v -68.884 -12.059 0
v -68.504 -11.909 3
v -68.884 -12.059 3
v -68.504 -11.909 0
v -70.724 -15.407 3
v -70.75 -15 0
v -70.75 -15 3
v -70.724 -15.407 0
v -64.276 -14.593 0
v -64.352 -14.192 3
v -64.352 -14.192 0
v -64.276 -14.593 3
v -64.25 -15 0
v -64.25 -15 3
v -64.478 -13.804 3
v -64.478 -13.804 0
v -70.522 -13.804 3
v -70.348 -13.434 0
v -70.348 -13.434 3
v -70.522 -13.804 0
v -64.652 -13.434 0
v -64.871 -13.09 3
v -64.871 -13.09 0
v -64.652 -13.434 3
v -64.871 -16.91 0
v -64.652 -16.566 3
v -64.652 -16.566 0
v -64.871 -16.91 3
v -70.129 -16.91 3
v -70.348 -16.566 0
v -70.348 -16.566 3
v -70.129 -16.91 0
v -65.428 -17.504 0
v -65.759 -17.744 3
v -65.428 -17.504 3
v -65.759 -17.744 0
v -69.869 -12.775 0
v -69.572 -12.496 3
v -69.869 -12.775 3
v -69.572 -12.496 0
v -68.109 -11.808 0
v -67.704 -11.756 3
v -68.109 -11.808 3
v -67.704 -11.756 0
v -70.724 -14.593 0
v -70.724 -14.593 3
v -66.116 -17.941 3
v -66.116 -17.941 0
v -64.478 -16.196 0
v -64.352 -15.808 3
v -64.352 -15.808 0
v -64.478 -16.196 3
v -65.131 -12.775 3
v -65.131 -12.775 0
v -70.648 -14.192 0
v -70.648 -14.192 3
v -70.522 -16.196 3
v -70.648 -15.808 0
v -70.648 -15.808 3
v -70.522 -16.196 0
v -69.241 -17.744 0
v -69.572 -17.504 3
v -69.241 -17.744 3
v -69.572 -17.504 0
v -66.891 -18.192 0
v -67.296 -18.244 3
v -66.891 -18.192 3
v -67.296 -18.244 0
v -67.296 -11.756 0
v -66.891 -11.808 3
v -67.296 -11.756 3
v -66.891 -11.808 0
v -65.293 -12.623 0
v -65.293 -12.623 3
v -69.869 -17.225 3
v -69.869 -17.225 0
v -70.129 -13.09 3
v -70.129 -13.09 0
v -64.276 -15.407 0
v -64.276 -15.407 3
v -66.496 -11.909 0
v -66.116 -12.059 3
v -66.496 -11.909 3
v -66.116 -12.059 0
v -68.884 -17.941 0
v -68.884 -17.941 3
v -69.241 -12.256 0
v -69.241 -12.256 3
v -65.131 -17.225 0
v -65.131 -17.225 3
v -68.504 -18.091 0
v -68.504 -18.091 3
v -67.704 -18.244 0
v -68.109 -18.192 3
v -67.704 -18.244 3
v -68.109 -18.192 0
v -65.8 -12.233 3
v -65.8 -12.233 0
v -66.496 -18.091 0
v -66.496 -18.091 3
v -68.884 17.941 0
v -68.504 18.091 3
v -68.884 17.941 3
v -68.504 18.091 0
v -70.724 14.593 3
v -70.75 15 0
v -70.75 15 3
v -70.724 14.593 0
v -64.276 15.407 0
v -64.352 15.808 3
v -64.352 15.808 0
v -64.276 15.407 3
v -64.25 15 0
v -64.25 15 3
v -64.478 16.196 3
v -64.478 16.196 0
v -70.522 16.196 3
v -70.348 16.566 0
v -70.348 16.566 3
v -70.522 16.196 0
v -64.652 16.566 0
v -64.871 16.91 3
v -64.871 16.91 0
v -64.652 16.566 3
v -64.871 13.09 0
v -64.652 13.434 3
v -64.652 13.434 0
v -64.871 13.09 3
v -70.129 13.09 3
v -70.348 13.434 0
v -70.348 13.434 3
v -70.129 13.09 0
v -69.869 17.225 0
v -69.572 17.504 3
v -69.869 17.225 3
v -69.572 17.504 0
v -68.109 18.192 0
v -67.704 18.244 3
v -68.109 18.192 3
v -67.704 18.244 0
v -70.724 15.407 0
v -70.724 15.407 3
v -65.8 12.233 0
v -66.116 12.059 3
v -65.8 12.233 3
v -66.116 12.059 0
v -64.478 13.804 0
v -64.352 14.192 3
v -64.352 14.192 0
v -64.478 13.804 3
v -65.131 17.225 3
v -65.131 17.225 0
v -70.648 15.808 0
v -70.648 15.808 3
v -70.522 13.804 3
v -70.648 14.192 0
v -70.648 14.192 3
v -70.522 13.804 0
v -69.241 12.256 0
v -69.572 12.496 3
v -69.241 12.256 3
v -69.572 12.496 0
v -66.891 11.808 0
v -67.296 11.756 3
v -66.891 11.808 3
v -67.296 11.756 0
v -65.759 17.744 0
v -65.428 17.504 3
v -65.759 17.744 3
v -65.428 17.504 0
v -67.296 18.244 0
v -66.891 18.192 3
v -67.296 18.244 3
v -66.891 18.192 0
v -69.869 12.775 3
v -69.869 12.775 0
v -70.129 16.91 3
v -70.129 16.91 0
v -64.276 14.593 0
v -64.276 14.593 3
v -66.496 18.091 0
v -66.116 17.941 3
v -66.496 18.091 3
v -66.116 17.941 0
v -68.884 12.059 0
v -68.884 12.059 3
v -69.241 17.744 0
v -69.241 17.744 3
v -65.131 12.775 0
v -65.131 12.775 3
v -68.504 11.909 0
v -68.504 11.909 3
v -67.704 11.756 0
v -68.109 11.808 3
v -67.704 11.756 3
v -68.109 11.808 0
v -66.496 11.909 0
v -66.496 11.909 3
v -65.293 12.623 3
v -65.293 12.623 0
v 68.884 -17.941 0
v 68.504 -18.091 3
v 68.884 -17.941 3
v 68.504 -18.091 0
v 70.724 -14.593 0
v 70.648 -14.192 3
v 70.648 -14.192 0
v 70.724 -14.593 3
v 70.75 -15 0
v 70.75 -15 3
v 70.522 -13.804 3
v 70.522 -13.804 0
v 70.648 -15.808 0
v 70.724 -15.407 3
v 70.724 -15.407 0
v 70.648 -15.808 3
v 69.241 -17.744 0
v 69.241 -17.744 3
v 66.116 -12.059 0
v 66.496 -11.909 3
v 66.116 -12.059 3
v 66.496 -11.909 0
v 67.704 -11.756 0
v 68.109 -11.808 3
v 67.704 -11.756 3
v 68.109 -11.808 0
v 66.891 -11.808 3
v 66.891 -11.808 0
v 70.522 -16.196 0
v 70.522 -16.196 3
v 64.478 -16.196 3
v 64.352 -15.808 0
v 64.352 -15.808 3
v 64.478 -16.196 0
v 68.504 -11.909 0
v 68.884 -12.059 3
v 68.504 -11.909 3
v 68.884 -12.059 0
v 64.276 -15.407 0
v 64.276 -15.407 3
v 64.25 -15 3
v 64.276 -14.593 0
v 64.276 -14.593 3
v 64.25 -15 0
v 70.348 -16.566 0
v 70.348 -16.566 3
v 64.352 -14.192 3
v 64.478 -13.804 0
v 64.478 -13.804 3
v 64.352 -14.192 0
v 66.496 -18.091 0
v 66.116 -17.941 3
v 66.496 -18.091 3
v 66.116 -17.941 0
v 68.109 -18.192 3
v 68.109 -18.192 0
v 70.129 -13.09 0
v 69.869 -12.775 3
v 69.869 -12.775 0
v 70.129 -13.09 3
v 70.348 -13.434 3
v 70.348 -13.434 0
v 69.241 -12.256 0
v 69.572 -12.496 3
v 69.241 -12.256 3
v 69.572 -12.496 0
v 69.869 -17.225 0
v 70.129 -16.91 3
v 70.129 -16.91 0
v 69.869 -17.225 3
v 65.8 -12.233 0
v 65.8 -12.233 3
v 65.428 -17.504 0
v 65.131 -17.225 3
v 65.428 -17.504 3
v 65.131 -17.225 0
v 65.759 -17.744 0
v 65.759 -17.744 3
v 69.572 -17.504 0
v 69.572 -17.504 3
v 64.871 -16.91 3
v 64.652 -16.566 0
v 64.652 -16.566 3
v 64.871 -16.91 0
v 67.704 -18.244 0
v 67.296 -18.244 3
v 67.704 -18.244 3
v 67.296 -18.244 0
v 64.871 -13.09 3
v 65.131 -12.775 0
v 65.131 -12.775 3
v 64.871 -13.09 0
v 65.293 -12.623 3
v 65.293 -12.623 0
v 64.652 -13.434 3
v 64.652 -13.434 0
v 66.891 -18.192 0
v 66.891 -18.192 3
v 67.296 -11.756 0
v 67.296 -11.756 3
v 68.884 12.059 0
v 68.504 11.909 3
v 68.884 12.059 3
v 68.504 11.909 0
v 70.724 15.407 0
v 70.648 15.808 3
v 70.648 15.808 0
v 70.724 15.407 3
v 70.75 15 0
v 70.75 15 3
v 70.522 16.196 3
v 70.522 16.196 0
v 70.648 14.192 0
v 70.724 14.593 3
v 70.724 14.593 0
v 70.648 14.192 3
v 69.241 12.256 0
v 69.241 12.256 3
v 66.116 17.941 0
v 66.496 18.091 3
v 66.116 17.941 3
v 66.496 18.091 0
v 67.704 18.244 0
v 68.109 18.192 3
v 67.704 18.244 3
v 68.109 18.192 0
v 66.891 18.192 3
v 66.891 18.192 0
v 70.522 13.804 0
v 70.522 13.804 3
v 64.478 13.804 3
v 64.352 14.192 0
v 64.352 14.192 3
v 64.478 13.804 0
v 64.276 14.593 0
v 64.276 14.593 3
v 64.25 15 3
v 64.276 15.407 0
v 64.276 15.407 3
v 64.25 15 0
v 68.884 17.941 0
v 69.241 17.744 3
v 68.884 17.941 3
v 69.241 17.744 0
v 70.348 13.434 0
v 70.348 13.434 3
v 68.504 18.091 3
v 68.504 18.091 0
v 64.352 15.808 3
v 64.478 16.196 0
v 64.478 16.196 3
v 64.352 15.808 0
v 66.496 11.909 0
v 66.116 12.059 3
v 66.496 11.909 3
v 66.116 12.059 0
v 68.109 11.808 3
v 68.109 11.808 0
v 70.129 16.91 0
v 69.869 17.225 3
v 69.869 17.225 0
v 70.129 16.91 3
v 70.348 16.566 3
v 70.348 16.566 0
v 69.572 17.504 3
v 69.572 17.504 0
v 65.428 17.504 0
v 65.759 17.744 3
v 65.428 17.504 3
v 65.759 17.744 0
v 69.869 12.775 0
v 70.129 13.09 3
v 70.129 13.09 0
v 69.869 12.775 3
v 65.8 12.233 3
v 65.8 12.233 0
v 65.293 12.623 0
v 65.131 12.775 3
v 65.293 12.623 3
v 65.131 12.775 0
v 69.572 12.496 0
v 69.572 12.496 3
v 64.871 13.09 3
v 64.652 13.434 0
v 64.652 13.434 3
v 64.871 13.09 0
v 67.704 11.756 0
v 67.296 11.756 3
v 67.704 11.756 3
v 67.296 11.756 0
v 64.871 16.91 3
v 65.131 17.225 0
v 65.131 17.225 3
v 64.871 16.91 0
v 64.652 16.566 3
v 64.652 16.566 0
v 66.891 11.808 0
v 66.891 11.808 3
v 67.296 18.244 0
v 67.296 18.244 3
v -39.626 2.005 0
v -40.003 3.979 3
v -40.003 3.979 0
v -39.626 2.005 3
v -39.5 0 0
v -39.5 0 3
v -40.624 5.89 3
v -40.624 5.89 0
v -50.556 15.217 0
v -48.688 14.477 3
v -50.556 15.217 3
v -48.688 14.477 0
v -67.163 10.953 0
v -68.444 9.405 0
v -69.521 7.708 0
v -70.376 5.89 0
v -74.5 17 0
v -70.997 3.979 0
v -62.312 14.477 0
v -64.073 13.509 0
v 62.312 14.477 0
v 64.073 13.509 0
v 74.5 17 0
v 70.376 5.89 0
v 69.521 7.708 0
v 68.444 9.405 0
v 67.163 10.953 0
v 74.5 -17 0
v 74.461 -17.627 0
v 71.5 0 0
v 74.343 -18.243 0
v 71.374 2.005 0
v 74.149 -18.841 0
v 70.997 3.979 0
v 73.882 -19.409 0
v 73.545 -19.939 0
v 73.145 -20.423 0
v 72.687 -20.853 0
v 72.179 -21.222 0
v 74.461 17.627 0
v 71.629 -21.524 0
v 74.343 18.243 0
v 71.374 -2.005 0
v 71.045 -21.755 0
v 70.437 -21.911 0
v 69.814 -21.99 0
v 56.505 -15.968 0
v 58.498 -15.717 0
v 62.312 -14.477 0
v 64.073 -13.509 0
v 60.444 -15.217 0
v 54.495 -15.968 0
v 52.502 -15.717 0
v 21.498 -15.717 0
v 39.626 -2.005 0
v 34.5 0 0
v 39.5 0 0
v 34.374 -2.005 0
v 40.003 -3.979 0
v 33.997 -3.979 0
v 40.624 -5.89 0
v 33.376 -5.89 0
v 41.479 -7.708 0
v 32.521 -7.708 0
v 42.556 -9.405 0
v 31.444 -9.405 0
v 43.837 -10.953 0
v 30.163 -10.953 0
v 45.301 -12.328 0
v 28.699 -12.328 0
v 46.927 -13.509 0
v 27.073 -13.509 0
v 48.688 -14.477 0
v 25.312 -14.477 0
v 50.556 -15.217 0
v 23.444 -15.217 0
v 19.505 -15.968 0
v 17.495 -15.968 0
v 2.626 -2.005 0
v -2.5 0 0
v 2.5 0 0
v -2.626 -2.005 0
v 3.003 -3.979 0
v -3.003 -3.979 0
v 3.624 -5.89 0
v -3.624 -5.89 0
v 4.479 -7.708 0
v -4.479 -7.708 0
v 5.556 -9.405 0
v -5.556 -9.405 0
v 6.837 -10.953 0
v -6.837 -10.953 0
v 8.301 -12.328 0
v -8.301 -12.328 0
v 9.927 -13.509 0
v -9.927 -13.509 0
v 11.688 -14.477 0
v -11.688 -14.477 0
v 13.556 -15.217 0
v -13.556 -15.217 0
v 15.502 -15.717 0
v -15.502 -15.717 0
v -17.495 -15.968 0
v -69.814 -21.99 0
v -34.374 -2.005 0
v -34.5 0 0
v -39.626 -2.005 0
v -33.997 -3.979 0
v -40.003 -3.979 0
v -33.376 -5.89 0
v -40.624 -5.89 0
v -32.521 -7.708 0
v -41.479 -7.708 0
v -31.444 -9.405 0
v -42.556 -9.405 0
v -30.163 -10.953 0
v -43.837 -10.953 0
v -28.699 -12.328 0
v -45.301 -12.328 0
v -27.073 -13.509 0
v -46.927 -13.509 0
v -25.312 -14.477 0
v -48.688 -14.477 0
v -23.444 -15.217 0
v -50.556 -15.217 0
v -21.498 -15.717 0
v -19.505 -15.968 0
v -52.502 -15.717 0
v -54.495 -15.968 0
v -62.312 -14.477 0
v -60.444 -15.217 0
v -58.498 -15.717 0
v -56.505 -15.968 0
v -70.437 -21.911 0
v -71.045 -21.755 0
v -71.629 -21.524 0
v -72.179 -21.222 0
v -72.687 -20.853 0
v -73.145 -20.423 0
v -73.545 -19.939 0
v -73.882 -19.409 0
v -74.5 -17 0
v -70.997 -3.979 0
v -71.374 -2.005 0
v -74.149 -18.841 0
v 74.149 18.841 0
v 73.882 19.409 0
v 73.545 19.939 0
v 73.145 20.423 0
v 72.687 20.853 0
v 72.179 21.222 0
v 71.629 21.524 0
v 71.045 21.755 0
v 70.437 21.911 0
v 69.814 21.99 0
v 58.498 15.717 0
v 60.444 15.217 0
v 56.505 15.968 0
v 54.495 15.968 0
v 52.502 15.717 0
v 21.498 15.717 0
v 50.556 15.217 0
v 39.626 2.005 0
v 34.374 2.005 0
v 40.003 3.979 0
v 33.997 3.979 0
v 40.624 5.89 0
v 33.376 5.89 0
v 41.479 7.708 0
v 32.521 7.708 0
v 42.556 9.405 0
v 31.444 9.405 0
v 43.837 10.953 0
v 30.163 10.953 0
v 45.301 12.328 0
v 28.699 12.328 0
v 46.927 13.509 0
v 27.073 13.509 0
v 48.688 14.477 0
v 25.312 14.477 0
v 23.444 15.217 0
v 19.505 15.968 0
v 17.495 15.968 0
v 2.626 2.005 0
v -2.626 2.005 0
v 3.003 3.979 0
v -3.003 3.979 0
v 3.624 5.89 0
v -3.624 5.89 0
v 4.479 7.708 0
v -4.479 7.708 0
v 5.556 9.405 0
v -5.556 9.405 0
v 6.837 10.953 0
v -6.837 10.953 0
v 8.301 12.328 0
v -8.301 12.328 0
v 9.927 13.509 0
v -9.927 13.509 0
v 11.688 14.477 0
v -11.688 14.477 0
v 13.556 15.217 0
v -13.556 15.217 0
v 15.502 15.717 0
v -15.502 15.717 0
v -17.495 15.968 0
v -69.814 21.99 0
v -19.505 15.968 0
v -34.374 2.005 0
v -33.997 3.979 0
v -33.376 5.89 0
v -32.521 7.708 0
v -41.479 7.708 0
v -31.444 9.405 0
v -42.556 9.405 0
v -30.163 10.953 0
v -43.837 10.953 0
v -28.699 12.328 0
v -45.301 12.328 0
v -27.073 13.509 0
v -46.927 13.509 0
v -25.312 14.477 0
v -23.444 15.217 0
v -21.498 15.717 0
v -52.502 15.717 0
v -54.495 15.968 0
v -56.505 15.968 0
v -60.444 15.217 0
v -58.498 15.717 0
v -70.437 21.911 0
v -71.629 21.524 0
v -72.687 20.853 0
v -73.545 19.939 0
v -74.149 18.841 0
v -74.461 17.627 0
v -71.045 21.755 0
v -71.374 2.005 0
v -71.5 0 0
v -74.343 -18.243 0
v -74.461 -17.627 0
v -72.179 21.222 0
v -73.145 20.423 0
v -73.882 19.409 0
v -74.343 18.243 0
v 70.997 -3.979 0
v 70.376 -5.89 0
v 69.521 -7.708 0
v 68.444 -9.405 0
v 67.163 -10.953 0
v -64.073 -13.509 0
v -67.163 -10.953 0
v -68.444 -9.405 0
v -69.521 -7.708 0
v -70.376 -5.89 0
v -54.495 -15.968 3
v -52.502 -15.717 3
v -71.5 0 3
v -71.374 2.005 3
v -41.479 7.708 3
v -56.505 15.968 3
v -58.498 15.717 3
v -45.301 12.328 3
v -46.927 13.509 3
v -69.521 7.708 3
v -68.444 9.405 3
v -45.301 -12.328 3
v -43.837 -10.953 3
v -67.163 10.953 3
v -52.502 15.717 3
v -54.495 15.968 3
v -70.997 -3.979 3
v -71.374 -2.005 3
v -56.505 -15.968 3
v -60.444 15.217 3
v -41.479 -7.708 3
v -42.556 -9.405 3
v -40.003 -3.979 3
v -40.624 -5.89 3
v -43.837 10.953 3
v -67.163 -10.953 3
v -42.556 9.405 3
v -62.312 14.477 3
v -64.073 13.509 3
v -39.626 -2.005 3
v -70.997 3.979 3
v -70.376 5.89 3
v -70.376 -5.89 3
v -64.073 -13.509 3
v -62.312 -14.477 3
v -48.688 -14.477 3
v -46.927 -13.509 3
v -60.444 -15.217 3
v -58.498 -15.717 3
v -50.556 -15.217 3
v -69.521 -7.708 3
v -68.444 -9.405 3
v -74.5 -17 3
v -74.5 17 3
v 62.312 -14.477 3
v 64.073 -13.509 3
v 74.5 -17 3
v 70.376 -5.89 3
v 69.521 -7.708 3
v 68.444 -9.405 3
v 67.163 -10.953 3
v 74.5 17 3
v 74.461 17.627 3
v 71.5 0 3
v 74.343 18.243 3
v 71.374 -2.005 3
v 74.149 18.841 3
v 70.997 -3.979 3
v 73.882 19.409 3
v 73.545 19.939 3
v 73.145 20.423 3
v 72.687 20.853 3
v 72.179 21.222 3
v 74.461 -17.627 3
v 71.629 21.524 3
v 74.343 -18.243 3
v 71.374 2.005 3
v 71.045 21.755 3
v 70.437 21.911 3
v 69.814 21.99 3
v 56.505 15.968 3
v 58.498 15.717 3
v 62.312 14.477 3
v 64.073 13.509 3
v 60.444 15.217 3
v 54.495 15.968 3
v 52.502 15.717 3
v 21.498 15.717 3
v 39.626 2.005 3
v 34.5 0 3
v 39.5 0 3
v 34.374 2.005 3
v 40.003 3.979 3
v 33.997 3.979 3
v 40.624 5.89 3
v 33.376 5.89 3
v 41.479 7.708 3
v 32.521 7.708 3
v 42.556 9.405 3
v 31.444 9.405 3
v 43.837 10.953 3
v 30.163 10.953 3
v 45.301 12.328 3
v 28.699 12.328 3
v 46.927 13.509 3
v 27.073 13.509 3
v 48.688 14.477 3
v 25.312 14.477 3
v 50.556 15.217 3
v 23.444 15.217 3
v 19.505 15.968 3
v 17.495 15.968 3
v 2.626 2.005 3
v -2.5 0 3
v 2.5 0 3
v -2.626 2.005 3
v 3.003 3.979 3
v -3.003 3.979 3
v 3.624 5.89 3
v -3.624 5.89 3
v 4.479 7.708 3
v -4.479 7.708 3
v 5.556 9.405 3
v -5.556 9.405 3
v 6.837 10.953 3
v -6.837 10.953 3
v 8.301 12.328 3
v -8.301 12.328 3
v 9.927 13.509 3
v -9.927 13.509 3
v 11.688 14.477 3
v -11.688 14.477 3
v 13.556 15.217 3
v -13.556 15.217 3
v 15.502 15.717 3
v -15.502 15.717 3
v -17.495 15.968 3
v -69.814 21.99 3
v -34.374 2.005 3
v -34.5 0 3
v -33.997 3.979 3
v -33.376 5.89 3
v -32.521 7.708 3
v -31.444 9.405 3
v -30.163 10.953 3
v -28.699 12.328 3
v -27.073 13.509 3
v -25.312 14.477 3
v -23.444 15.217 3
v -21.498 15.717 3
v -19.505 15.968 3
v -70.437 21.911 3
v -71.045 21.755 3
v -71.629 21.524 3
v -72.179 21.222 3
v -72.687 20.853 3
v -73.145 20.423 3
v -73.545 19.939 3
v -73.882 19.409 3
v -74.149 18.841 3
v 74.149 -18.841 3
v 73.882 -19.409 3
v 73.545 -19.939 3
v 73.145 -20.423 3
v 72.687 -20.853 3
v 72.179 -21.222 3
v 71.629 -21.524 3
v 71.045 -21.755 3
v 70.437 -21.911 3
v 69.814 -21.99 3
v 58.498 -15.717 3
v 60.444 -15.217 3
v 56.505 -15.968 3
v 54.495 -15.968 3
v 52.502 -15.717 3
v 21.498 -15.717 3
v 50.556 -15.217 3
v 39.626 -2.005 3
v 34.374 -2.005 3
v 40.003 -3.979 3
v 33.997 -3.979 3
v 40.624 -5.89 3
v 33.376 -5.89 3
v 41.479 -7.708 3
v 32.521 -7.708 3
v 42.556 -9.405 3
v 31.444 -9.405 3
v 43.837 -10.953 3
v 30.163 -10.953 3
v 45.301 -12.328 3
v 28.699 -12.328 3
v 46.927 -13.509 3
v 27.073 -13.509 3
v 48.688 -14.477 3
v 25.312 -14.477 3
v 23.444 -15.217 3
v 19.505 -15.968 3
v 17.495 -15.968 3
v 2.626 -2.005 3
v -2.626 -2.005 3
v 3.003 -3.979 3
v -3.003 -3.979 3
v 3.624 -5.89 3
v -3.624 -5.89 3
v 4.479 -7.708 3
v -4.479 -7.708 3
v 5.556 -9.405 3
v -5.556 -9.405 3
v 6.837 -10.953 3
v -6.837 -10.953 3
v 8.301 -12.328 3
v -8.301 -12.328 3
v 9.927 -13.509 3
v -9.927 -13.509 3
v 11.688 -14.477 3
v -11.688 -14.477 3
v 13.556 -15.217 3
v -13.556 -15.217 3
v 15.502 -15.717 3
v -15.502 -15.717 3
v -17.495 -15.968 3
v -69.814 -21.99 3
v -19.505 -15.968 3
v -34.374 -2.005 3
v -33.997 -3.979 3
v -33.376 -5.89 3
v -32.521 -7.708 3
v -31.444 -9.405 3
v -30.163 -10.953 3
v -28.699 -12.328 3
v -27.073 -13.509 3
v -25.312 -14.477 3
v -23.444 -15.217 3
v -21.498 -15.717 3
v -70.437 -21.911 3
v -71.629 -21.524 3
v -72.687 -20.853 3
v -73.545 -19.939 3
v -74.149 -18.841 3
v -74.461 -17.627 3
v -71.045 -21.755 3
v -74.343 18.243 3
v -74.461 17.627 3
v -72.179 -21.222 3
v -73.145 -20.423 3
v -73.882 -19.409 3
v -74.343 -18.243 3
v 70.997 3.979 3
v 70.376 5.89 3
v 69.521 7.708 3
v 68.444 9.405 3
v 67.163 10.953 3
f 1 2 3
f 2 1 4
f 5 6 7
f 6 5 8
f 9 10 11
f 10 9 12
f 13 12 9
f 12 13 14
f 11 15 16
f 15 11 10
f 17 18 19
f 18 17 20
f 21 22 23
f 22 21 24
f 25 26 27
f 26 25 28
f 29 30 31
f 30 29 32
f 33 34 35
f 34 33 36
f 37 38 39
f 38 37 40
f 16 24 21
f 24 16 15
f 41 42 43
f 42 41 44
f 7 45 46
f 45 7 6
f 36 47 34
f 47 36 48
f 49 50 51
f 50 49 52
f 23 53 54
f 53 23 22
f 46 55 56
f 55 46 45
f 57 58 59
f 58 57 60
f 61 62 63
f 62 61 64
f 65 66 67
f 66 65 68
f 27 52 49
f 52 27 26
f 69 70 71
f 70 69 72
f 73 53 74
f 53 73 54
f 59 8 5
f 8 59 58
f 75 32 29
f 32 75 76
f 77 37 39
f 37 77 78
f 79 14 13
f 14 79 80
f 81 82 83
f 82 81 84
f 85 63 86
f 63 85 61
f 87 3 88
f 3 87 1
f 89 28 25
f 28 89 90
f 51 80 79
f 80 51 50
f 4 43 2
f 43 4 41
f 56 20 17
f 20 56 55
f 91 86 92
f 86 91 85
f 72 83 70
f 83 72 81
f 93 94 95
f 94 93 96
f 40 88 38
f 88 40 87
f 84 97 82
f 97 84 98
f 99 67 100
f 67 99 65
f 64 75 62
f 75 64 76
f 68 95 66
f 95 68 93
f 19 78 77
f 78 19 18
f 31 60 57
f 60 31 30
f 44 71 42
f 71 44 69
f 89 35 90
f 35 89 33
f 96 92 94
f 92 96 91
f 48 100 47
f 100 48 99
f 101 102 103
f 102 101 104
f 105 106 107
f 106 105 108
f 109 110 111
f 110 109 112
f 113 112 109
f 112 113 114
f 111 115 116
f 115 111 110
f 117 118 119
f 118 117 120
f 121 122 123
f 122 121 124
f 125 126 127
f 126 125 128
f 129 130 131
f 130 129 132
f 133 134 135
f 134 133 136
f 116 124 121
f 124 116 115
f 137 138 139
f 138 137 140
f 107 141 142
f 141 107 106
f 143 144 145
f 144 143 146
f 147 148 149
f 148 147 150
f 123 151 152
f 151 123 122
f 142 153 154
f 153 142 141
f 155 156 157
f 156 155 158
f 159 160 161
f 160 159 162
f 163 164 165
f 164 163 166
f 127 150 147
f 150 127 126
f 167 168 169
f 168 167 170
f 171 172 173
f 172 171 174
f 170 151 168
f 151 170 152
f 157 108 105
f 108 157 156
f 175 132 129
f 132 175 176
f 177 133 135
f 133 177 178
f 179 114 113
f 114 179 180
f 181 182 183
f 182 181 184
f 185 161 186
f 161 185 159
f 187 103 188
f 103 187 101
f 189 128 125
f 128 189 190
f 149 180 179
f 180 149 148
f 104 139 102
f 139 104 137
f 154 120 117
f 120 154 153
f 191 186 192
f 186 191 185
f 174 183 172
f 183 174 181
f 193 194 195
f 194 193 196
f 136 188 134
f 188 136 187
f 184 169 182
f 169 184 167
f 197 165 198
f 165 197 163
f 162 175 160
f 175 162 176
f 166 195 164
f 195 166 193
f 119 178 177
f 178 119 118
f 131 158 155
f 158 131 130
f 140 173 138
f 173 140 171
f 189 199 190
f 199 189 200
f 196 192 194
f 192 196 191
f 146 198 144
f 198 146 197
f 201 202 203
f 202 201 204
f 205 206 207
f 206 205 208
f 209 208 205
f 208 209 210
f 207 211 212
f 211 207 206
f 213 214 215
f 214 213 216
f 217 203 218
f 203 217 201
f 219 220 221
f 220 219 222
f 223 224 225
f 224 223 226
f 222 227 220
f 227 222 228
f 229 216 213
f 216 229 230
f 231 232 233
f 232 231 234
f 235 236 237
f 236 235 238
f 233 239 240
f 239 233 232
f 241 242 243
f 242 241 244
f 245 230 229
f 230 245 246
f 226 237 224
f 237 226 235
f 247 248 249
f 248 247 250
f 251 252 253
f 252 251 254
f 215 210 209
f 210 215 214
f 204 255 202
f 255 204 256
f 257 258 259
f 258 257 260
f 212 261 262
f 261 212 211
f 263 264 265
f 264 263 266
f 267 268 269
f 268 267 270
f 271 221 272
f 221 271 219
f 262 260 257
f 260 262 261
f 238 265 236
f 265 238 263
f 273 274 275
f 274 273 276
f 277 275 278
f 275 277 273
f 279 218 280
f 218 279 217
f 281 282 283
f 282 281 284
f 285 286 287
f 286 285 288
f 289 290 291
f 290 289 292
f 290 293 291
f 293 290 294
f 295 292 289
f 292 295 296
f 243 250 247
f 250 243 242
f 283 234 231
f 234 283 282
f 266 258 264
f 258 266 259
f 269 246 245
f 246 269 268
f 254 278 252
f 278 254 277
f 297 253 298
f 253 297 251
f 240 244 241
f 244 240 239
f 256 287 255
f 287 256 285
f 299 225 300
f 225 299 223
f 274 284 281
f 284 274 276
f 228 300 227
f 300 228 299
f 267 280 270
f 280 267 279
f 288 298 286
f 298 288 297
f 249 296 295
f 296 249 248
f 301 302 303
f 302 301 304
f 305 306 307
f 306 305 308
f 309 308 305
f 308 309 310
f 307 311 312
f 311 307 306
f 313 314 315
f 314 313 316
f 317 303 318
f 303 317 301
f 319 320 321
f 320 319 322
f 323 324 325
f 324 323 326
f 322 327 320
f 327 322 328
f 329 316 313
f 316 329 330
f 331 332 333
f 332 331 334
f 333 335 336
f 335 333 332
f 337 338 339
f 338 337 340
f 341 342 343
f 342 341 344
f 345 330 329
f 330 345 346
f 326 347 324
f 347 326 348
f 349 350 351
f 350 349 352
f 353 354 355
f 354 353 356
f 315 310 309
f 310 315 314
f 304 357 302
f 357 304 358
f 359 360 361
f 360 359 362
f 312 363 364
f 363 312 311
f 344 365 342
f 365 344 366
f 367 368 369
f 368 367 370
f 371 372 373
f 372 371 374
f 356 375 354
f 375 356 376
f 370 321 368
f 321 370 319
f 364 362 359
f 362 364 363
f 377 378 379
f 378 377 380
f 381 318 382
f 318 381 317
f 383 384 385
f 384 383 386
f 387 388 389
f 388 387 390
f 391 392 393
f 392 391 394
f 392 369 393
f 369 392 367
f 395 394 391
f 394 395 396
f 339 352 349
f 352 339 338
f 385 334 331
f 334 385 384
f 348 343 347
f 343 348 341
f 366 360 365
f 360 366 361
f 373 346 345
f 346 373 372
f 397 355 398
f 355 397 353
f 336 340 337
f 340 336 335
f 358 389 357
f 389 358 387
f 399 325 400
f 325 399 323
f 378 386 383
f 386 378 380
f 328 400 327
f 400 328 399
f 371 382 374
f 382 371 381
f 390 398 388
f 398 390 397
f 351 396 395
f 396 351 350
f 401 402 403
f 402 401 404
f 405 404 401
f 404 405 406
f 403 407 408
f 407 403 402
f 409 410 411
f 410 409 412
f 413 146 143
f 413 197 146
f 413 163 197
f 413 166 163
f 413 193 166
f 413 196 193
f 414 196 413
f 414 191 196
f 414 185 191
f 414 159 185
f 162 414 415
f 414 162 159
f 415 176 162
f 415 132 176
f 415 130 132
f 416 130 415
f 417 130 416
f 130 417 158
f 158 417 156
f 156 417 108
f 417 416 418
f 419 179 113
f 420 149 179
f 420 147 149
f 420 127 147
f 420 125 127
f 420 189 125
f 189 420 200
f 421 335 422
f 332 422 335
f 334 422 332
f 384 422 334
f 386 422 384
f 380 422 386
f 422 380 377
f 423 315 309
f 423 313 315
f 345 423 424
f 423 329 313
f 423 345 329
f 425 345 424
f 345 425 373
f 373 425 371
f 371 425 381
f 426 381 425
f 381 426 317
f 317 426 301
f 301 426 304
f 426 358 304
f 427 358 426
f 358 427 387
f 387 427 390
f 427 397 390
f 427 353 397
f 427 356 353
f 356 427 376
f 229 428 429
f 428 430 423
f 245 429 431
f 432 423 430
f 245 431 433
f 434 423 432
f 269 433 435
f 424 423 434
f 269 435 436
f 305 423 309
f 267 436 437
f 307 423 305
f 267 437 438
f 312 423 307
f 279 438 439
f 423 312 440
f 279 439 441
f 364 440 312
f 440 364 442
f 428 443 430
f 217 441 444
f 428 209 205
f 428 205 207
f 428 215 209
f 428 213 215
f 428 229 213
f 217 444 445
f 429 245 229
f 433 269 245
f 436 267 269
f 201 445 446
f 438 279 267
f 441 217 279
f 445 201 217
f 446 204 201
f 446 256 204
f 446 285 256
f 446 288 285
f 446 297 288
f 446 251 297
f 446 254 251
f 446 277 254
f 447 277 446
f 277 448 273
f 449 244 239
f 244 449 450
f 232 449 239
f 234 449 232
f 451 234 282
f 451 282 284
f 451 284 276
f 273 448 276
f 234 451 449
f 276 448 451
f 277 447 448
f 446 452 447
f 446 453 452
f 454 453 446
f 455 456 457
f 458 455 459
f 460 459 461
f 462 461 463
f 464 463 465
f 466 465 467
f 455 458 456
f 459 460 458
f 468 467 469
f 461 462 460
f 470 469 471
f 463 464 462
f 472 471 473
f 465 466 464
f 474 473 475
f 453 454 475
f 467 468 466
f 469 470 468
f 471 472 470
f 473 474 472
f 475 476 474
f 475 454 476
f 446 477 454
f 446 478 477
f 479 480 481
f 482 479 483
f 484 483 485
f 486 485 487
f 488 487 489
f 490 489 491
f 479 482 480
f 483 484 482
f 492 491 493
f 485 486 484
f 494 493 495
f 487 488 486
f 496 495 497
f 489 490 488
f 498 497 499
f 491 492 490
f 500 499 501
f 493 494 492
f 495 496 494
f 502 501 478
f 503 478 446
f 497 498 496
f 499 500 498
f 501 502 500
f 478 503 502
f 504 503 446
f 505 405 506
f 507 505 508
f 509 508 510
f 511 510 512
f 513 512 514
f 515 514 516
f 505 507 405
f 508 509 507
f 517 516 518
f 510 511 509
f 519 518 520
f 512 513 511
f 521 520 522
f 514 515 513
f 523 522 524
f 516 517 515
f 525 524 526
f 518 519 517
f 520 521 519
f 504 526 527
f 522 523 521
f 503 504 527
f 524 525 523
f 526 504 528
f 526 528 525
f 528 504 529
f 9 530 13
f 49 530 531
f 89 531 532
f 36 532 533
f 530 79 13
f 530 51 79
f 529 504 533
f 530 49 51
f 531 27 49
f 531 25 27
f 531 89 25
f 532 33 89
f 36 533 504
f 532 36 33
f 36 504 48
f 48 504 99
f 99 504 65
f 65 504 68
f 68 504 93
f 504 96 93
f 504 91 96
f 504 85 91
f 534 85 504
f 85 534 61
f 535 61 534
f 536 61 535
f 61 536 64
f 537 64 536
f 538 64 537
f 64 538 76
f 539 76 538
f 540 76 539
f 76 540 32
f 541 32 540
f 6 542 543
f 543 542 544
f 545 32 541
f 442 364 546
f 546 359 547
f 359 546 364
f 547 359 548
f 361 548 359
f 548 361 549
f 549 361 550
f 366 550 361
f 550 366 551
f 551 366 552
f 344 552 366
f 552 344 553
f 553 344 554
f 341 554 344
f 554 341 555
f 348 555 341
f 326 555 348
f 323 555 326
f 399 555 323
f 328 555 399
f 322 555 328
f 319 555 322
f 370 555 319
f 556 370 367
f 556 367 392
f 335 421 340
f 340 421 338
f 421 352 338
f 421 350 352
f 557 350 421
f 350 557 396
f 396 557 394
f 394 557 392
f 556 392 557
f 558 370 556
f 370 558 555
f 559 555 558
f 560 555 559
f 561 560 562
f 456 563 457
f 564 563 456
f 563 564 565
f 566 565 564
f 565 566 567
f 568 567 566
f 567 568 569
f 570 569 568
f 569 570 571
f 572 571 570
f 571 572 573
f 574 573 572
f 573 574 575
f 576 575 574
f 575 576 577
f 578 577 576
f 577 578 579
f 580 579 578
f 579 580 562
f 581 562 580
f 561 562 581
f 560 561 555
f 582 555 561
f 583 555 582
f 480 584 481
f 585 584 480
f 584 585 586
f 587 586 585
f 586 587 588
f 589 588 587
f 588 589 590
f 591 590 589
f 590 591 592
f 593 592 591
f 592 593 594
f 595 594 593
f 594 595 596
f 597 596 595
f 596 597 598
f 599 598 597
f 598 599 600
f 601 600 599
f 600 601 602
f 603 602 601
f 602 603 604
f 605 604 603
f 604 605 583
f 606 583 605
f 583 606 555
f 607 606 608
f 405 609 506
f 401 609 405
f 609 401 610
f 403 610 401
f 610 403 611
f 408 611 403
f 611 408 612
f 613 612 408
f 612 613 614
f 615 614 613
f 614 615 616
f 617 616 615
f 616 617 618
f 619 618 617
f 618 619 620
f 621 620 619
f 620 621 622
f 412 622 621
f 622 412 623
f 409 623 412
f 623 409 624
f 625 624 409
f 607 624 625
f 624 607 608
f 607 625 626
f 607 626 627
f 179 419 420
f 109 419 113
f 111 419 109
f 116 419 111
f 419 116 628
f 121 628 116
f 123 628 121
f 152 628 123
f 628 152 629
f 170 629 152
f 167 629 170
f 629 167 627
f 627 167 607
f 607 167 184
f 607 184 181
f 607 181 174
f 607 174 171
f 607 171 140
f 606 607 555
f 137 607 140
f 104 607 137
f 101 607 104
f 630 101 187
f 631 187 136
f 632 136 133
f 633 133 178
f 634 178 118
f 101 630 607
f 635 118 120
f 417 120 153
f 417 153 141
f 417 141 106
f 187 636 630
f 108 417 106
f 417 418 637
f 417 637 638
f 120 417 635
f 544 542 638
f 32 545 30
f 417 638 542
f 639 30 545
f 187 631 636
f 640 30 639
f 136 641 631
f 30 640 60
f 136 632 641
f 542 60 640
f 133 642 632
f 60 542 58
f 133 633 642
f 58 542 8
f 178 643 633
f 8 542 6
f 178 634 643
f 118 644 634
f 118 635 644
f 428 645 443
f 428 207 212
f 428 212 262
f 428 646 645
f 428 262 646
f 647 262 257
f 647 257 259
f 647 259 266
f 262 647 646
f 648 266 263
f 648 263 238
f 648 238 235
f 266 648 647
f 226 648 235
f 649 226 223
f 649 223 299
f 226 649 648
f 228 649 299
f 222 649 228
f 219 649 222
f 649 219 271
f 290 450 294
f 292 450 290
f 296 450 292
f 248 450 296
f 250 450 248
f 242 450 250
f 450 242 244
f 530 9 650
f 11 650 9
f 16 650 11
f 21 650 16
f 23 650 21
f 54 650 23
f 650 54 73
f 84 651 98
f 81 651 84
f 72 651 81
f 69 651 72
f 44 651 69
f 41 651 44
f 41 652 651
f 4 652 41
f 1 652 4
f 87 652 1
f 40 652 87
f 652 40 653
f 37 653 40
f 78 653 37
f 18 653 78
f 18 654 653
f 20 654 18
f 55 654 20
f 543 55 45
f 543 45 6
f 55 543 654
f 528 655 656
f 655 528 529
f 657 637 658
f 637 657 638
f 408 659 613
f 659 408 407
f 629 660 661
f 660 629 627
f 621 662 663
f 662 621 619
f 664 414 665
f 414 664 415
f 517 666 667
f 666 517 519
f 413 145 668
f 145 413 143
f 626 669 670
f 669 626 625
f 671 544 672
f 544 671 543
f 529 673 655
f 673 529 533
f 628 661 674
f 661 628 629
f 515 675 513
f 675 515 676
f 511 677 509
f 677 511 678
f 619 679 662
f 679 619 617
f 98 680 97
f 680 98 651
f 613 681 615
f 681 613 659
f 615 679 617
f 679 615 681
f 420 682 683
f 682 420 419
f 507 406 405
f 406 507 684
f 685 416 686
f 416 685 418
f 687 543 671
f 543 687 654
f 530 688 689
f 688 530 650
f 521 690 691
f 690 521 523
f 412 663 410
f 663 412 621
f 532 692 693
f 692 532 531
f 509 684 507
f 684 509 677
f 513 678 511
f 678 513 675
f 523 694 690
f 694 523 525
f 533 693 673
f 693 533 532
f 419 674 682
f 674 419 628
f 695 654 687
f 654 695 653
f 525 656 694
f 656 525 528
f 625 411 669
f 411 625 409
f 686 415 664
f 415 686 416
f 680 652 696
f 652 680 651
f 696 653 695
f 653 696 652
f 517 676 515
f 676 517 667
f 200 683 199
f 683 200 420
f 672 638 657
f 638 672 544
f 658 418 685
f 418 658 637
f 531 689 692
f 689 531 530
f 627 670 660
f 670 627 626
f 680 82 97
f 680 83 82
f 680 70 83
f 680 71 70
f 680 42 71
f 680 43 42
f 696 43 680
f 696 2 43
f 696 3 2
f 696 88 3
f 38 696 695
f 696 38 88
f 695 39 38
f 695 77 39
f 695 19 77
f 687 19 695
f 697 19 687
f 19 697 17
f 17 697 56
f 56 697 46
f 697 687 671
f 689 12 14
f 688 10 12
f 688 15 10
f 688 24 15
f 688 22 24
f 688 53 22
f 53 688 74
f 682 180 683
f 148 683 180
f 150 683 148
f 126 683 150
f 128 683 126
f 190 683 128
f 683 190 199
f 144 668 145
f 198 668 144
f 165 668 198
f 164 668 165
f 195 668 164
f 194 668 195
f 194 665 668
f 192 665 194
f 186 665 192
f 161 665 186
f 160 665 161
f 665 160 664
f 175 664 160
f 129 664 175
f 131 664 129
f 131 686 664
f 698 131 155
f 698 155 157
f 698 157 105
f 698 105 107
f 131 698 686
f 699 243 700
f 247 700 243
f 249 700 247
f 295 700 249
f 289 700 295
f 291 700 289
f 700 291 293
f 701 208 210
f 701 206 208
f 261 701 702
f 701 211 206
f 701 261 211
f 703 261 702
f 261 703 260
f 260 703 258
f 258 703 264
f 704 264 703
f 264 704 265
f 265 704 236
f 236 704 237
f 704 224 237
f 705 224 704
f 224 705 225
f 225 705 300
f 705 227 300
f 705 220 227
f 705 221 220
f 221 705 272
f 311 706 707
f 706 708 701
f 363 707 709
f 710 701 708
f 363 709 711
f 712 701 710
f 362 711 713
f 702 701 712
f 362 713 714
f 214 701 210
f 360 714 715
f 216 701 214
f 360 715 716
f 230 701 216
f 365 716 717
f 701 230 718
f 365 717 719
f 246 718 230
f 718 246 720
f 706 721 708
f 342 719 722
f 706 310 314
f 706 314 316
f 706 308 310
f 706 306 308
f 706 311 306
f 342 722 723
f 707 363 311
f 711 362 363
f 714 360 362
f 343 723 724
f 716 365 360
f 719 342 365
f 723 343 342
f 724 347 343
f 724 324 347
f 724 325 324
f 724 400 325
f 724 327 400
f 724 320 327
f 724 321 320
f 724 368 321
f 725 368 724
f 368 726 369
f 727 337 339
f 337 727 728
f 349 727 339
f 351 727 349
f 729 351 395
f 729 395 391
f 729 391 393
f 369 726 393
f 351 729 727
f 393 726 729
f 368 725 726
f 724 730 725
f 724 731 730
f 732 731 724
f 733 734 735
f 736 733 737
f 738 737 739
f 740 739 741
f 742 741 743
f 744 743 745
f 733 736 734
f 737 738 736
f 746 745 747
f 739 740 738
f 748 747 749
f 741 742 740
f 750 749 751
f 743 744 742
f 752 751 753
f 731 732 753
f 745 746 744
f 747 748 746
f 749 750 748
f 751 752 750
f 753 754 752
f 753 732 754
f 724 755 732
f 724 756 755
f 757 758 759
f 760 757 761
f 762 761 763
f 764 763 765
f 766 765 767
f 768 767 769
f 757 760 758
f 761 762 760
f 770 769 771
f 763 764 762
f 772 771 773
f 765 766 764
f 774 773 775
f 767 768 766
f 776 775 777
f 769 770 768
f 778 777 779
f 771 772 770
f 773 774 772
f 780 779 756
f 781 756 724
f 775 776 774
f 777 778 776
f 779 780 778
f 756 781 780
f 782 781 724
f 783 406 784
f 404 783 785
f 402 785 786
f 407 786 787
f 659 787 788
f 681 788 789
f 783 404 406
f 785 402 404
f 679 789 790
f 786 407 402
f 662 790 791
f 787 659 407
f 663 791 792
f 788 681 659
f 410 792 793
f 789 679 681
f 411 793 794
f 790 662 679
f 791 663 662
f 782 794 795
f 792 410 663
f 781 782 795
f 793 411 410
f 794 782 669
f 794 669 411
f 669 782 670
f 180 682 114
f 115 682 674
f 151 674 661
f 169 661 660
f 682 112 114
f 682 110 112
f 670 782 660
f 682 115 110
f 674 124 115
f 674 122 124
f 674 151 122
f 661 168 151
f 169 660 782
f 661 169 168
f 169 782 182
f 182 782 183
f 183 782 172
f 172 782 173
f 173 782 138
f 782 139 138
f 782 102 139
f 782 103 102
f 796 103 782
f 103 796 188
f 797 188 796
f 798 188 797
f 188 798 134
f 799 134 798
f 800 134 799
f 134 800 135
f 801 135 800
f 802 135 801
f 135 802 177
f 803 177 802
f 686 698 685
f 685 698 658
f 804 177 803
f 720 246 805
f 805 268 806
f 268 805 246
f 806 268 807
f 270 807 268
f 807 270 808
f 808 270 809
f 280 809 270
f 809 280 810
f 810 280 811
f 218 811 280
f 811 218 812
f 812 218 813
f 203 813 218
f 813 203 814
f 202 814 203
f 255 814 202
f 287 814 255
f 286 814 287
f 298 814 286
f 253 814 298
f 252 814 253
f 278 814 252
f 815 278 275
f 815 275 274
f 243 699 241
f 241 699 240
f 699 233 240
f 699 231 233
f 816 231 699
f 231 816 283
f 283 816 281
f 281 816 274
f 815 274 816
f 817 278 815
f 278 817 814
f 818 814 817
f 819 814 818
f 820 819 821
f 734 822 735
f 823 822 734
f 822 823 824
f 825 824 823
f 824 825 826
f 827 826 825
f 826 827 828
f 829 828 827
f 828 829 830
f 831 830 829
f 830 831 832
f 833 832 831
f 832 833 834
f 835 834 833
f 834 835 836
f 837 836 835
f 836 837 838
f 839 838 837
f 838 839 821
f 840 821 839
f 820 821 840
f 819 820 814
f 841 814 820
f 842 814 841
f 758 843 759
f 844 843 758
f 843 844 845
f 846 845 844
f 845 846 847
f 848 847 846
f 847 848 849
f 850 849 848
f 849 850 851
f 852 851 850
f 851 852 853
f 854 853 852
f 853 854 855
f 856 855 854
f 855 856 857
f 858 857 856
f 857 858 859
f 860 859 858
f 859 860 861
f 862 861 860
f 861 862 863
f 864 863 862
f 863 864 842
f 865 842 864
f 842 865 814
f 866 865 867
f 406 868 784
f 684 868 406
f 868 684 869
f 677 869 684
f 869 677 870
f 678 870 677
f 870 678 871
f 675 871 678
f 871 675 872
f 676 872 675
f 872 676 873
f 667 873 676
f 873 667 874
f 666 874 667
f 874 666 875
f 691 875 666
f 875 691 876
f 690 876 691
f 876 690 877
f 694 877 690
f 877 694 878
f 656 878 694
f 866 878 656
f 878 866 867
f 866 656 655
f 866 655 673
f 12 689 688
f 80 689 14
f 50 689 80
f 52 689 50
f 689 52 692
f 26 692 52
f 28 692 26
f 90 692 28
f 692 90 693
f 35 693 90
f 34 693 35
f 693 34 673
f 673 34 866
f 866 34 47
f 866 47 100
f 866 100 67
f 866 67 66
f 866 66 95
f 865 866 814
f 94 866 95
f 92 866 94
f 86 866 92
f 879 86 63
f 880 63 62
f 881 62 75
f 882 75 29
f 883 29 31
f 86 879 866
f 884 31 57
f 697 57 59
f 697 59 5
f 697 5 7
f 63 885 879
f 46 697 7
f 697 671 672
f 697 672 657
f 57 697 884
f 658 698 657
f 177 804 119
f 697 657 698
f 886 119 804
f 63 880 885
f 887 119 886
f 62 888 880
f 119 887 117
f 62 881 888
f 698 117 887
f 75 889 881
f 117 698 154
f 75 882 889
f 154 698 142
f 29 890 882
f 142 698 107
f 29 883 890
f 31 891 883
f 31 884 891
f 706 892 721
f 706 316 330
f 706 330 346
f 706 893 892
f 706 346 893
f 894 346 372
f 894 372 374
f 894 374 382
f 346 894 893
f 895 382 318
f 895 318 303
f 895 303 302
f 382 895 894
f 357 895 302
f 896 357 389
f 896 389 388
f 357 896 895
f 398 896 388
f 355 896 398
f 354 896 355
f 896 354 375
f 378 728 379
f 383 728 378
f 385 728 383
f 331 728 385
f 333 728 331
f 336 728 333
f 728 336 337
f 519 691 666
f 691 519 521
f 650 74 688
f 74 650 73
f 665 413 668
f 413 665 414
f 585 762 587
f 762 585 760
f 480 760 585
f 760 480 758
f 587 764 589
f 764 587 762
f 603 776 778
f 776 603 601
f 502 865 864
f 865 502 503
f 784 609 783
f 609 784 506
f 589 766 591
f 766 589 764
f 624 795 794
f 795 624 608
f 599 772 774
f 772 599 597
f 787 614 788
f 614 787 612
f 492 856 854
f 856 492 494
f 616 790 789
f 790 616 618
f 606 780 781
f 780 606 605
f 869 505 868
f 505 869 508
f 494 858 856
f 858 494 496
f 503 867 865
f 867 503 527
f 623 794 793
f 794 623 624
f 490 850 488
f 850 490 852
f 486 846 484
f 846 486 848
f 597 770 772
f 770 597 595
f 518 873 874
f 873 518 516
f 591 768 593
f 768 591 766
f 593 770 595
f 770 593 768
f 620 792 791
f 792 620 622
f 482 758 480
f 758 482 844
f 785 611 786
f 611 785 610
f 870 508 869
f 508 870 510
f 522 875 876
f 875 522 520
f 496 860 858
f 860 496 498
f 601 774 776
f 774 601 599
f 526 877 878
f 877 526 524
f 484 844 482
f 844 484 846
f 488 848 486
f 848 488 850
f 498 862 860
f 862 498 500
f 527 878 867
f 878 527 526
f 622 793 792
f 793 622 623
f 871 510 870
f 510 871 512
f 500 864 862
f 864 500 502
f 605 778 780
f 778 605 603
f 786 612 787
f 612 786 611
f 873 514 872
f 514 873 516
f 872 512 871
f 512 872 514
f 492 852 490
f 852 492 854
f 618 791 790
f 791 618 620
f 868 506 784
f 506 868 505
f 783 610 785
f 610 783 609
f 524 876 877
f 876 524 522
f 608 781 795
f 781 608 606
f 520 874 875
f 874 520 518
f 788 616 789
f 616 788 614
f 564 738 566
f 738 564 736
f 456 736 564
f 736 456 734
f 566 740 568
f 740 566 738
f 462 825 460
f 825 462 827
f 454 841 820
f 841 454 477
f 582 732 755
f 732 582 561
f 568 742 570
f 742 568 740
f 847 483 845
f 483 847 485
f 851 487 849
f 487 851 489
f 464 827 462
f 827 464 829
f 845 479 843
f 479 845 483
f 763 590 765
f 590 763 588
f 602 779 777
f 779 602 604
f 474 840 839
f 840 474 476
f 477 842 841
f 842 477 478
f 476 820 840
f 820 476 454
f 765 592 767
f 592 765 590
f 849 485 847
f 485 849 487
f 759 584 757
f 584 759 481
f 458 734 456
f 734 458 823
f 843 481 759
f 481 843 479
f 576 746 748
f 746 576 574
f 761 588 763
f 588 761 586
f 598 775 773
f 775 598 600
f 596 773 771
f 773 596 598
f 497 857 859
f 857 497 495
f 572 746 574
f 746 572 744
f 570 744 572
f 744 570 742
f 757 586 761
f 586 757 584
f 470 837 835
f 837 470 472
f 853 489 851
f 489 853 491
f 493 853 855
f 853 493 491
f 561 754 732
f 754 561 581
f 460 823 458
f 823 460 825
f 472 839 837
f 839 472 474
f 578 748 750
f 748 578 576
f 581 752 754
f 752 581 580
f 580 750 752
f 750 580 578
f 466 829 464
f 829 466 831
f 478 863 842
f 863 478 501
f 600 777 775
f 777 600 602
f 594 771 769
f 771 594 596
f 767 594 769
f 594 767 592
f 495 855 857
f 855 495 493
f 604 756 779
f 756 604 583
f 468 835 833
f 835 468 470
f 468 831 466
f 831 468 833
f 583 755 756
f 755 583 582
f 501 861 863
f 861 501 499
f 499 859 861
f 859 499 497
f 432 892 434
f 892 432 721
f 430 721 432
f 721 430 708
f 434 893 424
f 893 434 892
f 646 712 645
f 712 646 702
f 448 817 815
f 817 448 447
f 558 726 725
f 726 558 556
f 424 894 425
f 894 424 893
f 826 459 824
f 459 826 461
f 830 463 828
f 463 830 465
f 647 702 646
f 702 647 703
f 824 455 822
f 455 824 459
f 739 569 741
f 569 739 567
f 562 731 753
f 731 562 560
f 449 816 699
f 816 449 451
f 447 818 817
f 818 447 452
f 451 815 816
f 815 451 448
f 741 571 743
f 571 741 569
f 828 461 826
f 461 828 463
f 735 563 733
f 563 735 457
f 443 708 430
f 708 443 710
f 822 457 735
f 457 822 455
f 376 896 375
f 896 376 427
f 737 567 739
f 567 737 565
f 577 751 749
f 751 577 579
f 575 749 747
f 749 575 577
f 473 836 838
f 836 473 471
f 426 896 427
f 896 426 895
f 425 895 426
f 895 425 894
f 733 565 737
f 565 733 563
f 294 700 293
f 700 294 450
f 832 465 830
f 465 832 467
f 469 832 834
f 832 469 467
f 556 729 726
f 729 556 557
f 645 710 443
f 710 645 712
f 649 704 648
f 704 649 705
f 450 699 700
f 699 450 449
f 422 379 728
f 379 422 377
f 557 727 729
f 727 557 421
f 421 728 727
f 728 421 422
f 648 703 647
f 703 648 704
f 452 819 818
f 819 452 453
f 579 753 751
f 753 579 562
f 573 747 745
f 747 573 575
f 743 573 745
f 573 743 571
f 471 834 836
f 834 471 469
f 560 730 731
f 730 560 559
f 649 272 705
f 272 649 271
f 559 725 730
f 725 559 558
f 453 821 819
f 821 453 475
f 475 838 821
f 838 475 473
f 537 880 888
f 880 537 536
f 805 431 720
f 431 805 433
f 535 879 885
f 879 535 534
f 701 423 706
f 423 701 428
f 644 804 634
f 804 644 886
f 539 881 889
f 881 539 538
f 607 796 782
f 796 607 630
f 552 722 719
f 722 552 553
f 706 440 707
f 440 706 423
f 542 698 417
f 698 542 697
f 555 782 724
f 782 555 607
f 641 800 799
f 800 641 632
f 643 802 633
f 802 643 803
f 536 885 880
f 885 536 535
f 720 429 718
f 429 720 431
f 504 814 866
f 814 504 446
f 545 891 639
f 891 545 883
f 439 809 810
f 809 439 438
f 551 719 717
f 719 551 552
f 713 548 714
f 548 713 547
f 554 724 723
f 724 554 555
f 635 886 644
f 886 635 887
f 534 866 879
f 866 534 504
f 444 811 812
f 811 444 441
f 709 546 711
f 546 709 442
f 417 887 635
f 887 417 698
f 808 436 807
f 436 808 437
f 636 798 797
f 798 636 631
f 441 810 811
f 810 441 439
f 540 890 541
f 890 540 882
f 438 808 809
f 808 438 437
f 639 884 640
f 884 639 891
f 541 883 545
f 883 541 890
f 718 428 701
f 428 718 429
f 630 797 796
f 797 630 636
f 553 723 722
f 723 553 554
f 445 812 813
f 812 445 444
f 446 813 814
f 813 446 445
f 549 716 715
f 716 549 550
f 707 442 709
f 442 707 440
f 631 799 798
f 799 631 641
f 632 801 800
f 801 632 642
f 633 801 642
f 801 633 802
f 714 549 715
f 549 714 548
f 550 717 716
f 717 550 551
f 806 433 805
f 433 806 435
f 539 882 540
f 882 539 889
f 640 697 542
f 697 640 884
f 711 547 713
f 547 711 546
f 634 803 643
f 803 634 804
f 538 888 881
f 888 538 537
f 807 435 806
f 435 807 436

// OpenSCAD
$fn = 50;


difference() {
	union() {
		hull() {
			translate(v = [-69.5000000000, 17.0000000000, 0]) {
				cylinder(h = 3, r = 5);
			}
			translate(v = [69.5000000000, 17.0000000000, 0]) {
				cylinder(h = 3, r = 5);
			}
			translate(v = [-69.5000000000, -17.0000000000, 0]) {
				cylinder(h = 3, r = 5);
			}
			translate(v = [69.5000000000, -17.0000000000, 0]) {
				cylinder(h = 3, r = 5);
			}
		}
	}
	union() {
		#translate(v = [-67.5000000000, -15.0000000000, -100.0000000000]) {
			cylinder(h = 200, r = 3.2500000000);
		}
		#translate(v = [-67.5000000000, 15.0000000000, -100.0000000000]) {
			cylinder(h = 200, r = 3.2500000000);
		}
		#translate(v = [67.5000000000, -15.0000000000, -100.0000000000]) {
			cylinder(h = 200, r = 3.2500000000);
		}
		#translate(v = [67.5000000000, 15.0000000000, -100.0000000000]) {
			cylinder(h = 200, r = 3.2500000000);
		}
		#translate(v = [-55.5000000000, 0, 0]) {
			cylinder(h = 3, r = 16.0000000000);
		}
		#translate(v = [-18.5000000000, 0, 0]) {
			cylinder(h = 3, r = 16.0000000000);
		}
		#translate(v = [18.5000000000, 0, 0]) {
			cylinder(h = 3, r = 16.0000000000);
		}
		#translate(v = [55.5000000000, 0, 0]) {
			cylinder(h = 3, r = 16.0000000000);
		}
	}
}
